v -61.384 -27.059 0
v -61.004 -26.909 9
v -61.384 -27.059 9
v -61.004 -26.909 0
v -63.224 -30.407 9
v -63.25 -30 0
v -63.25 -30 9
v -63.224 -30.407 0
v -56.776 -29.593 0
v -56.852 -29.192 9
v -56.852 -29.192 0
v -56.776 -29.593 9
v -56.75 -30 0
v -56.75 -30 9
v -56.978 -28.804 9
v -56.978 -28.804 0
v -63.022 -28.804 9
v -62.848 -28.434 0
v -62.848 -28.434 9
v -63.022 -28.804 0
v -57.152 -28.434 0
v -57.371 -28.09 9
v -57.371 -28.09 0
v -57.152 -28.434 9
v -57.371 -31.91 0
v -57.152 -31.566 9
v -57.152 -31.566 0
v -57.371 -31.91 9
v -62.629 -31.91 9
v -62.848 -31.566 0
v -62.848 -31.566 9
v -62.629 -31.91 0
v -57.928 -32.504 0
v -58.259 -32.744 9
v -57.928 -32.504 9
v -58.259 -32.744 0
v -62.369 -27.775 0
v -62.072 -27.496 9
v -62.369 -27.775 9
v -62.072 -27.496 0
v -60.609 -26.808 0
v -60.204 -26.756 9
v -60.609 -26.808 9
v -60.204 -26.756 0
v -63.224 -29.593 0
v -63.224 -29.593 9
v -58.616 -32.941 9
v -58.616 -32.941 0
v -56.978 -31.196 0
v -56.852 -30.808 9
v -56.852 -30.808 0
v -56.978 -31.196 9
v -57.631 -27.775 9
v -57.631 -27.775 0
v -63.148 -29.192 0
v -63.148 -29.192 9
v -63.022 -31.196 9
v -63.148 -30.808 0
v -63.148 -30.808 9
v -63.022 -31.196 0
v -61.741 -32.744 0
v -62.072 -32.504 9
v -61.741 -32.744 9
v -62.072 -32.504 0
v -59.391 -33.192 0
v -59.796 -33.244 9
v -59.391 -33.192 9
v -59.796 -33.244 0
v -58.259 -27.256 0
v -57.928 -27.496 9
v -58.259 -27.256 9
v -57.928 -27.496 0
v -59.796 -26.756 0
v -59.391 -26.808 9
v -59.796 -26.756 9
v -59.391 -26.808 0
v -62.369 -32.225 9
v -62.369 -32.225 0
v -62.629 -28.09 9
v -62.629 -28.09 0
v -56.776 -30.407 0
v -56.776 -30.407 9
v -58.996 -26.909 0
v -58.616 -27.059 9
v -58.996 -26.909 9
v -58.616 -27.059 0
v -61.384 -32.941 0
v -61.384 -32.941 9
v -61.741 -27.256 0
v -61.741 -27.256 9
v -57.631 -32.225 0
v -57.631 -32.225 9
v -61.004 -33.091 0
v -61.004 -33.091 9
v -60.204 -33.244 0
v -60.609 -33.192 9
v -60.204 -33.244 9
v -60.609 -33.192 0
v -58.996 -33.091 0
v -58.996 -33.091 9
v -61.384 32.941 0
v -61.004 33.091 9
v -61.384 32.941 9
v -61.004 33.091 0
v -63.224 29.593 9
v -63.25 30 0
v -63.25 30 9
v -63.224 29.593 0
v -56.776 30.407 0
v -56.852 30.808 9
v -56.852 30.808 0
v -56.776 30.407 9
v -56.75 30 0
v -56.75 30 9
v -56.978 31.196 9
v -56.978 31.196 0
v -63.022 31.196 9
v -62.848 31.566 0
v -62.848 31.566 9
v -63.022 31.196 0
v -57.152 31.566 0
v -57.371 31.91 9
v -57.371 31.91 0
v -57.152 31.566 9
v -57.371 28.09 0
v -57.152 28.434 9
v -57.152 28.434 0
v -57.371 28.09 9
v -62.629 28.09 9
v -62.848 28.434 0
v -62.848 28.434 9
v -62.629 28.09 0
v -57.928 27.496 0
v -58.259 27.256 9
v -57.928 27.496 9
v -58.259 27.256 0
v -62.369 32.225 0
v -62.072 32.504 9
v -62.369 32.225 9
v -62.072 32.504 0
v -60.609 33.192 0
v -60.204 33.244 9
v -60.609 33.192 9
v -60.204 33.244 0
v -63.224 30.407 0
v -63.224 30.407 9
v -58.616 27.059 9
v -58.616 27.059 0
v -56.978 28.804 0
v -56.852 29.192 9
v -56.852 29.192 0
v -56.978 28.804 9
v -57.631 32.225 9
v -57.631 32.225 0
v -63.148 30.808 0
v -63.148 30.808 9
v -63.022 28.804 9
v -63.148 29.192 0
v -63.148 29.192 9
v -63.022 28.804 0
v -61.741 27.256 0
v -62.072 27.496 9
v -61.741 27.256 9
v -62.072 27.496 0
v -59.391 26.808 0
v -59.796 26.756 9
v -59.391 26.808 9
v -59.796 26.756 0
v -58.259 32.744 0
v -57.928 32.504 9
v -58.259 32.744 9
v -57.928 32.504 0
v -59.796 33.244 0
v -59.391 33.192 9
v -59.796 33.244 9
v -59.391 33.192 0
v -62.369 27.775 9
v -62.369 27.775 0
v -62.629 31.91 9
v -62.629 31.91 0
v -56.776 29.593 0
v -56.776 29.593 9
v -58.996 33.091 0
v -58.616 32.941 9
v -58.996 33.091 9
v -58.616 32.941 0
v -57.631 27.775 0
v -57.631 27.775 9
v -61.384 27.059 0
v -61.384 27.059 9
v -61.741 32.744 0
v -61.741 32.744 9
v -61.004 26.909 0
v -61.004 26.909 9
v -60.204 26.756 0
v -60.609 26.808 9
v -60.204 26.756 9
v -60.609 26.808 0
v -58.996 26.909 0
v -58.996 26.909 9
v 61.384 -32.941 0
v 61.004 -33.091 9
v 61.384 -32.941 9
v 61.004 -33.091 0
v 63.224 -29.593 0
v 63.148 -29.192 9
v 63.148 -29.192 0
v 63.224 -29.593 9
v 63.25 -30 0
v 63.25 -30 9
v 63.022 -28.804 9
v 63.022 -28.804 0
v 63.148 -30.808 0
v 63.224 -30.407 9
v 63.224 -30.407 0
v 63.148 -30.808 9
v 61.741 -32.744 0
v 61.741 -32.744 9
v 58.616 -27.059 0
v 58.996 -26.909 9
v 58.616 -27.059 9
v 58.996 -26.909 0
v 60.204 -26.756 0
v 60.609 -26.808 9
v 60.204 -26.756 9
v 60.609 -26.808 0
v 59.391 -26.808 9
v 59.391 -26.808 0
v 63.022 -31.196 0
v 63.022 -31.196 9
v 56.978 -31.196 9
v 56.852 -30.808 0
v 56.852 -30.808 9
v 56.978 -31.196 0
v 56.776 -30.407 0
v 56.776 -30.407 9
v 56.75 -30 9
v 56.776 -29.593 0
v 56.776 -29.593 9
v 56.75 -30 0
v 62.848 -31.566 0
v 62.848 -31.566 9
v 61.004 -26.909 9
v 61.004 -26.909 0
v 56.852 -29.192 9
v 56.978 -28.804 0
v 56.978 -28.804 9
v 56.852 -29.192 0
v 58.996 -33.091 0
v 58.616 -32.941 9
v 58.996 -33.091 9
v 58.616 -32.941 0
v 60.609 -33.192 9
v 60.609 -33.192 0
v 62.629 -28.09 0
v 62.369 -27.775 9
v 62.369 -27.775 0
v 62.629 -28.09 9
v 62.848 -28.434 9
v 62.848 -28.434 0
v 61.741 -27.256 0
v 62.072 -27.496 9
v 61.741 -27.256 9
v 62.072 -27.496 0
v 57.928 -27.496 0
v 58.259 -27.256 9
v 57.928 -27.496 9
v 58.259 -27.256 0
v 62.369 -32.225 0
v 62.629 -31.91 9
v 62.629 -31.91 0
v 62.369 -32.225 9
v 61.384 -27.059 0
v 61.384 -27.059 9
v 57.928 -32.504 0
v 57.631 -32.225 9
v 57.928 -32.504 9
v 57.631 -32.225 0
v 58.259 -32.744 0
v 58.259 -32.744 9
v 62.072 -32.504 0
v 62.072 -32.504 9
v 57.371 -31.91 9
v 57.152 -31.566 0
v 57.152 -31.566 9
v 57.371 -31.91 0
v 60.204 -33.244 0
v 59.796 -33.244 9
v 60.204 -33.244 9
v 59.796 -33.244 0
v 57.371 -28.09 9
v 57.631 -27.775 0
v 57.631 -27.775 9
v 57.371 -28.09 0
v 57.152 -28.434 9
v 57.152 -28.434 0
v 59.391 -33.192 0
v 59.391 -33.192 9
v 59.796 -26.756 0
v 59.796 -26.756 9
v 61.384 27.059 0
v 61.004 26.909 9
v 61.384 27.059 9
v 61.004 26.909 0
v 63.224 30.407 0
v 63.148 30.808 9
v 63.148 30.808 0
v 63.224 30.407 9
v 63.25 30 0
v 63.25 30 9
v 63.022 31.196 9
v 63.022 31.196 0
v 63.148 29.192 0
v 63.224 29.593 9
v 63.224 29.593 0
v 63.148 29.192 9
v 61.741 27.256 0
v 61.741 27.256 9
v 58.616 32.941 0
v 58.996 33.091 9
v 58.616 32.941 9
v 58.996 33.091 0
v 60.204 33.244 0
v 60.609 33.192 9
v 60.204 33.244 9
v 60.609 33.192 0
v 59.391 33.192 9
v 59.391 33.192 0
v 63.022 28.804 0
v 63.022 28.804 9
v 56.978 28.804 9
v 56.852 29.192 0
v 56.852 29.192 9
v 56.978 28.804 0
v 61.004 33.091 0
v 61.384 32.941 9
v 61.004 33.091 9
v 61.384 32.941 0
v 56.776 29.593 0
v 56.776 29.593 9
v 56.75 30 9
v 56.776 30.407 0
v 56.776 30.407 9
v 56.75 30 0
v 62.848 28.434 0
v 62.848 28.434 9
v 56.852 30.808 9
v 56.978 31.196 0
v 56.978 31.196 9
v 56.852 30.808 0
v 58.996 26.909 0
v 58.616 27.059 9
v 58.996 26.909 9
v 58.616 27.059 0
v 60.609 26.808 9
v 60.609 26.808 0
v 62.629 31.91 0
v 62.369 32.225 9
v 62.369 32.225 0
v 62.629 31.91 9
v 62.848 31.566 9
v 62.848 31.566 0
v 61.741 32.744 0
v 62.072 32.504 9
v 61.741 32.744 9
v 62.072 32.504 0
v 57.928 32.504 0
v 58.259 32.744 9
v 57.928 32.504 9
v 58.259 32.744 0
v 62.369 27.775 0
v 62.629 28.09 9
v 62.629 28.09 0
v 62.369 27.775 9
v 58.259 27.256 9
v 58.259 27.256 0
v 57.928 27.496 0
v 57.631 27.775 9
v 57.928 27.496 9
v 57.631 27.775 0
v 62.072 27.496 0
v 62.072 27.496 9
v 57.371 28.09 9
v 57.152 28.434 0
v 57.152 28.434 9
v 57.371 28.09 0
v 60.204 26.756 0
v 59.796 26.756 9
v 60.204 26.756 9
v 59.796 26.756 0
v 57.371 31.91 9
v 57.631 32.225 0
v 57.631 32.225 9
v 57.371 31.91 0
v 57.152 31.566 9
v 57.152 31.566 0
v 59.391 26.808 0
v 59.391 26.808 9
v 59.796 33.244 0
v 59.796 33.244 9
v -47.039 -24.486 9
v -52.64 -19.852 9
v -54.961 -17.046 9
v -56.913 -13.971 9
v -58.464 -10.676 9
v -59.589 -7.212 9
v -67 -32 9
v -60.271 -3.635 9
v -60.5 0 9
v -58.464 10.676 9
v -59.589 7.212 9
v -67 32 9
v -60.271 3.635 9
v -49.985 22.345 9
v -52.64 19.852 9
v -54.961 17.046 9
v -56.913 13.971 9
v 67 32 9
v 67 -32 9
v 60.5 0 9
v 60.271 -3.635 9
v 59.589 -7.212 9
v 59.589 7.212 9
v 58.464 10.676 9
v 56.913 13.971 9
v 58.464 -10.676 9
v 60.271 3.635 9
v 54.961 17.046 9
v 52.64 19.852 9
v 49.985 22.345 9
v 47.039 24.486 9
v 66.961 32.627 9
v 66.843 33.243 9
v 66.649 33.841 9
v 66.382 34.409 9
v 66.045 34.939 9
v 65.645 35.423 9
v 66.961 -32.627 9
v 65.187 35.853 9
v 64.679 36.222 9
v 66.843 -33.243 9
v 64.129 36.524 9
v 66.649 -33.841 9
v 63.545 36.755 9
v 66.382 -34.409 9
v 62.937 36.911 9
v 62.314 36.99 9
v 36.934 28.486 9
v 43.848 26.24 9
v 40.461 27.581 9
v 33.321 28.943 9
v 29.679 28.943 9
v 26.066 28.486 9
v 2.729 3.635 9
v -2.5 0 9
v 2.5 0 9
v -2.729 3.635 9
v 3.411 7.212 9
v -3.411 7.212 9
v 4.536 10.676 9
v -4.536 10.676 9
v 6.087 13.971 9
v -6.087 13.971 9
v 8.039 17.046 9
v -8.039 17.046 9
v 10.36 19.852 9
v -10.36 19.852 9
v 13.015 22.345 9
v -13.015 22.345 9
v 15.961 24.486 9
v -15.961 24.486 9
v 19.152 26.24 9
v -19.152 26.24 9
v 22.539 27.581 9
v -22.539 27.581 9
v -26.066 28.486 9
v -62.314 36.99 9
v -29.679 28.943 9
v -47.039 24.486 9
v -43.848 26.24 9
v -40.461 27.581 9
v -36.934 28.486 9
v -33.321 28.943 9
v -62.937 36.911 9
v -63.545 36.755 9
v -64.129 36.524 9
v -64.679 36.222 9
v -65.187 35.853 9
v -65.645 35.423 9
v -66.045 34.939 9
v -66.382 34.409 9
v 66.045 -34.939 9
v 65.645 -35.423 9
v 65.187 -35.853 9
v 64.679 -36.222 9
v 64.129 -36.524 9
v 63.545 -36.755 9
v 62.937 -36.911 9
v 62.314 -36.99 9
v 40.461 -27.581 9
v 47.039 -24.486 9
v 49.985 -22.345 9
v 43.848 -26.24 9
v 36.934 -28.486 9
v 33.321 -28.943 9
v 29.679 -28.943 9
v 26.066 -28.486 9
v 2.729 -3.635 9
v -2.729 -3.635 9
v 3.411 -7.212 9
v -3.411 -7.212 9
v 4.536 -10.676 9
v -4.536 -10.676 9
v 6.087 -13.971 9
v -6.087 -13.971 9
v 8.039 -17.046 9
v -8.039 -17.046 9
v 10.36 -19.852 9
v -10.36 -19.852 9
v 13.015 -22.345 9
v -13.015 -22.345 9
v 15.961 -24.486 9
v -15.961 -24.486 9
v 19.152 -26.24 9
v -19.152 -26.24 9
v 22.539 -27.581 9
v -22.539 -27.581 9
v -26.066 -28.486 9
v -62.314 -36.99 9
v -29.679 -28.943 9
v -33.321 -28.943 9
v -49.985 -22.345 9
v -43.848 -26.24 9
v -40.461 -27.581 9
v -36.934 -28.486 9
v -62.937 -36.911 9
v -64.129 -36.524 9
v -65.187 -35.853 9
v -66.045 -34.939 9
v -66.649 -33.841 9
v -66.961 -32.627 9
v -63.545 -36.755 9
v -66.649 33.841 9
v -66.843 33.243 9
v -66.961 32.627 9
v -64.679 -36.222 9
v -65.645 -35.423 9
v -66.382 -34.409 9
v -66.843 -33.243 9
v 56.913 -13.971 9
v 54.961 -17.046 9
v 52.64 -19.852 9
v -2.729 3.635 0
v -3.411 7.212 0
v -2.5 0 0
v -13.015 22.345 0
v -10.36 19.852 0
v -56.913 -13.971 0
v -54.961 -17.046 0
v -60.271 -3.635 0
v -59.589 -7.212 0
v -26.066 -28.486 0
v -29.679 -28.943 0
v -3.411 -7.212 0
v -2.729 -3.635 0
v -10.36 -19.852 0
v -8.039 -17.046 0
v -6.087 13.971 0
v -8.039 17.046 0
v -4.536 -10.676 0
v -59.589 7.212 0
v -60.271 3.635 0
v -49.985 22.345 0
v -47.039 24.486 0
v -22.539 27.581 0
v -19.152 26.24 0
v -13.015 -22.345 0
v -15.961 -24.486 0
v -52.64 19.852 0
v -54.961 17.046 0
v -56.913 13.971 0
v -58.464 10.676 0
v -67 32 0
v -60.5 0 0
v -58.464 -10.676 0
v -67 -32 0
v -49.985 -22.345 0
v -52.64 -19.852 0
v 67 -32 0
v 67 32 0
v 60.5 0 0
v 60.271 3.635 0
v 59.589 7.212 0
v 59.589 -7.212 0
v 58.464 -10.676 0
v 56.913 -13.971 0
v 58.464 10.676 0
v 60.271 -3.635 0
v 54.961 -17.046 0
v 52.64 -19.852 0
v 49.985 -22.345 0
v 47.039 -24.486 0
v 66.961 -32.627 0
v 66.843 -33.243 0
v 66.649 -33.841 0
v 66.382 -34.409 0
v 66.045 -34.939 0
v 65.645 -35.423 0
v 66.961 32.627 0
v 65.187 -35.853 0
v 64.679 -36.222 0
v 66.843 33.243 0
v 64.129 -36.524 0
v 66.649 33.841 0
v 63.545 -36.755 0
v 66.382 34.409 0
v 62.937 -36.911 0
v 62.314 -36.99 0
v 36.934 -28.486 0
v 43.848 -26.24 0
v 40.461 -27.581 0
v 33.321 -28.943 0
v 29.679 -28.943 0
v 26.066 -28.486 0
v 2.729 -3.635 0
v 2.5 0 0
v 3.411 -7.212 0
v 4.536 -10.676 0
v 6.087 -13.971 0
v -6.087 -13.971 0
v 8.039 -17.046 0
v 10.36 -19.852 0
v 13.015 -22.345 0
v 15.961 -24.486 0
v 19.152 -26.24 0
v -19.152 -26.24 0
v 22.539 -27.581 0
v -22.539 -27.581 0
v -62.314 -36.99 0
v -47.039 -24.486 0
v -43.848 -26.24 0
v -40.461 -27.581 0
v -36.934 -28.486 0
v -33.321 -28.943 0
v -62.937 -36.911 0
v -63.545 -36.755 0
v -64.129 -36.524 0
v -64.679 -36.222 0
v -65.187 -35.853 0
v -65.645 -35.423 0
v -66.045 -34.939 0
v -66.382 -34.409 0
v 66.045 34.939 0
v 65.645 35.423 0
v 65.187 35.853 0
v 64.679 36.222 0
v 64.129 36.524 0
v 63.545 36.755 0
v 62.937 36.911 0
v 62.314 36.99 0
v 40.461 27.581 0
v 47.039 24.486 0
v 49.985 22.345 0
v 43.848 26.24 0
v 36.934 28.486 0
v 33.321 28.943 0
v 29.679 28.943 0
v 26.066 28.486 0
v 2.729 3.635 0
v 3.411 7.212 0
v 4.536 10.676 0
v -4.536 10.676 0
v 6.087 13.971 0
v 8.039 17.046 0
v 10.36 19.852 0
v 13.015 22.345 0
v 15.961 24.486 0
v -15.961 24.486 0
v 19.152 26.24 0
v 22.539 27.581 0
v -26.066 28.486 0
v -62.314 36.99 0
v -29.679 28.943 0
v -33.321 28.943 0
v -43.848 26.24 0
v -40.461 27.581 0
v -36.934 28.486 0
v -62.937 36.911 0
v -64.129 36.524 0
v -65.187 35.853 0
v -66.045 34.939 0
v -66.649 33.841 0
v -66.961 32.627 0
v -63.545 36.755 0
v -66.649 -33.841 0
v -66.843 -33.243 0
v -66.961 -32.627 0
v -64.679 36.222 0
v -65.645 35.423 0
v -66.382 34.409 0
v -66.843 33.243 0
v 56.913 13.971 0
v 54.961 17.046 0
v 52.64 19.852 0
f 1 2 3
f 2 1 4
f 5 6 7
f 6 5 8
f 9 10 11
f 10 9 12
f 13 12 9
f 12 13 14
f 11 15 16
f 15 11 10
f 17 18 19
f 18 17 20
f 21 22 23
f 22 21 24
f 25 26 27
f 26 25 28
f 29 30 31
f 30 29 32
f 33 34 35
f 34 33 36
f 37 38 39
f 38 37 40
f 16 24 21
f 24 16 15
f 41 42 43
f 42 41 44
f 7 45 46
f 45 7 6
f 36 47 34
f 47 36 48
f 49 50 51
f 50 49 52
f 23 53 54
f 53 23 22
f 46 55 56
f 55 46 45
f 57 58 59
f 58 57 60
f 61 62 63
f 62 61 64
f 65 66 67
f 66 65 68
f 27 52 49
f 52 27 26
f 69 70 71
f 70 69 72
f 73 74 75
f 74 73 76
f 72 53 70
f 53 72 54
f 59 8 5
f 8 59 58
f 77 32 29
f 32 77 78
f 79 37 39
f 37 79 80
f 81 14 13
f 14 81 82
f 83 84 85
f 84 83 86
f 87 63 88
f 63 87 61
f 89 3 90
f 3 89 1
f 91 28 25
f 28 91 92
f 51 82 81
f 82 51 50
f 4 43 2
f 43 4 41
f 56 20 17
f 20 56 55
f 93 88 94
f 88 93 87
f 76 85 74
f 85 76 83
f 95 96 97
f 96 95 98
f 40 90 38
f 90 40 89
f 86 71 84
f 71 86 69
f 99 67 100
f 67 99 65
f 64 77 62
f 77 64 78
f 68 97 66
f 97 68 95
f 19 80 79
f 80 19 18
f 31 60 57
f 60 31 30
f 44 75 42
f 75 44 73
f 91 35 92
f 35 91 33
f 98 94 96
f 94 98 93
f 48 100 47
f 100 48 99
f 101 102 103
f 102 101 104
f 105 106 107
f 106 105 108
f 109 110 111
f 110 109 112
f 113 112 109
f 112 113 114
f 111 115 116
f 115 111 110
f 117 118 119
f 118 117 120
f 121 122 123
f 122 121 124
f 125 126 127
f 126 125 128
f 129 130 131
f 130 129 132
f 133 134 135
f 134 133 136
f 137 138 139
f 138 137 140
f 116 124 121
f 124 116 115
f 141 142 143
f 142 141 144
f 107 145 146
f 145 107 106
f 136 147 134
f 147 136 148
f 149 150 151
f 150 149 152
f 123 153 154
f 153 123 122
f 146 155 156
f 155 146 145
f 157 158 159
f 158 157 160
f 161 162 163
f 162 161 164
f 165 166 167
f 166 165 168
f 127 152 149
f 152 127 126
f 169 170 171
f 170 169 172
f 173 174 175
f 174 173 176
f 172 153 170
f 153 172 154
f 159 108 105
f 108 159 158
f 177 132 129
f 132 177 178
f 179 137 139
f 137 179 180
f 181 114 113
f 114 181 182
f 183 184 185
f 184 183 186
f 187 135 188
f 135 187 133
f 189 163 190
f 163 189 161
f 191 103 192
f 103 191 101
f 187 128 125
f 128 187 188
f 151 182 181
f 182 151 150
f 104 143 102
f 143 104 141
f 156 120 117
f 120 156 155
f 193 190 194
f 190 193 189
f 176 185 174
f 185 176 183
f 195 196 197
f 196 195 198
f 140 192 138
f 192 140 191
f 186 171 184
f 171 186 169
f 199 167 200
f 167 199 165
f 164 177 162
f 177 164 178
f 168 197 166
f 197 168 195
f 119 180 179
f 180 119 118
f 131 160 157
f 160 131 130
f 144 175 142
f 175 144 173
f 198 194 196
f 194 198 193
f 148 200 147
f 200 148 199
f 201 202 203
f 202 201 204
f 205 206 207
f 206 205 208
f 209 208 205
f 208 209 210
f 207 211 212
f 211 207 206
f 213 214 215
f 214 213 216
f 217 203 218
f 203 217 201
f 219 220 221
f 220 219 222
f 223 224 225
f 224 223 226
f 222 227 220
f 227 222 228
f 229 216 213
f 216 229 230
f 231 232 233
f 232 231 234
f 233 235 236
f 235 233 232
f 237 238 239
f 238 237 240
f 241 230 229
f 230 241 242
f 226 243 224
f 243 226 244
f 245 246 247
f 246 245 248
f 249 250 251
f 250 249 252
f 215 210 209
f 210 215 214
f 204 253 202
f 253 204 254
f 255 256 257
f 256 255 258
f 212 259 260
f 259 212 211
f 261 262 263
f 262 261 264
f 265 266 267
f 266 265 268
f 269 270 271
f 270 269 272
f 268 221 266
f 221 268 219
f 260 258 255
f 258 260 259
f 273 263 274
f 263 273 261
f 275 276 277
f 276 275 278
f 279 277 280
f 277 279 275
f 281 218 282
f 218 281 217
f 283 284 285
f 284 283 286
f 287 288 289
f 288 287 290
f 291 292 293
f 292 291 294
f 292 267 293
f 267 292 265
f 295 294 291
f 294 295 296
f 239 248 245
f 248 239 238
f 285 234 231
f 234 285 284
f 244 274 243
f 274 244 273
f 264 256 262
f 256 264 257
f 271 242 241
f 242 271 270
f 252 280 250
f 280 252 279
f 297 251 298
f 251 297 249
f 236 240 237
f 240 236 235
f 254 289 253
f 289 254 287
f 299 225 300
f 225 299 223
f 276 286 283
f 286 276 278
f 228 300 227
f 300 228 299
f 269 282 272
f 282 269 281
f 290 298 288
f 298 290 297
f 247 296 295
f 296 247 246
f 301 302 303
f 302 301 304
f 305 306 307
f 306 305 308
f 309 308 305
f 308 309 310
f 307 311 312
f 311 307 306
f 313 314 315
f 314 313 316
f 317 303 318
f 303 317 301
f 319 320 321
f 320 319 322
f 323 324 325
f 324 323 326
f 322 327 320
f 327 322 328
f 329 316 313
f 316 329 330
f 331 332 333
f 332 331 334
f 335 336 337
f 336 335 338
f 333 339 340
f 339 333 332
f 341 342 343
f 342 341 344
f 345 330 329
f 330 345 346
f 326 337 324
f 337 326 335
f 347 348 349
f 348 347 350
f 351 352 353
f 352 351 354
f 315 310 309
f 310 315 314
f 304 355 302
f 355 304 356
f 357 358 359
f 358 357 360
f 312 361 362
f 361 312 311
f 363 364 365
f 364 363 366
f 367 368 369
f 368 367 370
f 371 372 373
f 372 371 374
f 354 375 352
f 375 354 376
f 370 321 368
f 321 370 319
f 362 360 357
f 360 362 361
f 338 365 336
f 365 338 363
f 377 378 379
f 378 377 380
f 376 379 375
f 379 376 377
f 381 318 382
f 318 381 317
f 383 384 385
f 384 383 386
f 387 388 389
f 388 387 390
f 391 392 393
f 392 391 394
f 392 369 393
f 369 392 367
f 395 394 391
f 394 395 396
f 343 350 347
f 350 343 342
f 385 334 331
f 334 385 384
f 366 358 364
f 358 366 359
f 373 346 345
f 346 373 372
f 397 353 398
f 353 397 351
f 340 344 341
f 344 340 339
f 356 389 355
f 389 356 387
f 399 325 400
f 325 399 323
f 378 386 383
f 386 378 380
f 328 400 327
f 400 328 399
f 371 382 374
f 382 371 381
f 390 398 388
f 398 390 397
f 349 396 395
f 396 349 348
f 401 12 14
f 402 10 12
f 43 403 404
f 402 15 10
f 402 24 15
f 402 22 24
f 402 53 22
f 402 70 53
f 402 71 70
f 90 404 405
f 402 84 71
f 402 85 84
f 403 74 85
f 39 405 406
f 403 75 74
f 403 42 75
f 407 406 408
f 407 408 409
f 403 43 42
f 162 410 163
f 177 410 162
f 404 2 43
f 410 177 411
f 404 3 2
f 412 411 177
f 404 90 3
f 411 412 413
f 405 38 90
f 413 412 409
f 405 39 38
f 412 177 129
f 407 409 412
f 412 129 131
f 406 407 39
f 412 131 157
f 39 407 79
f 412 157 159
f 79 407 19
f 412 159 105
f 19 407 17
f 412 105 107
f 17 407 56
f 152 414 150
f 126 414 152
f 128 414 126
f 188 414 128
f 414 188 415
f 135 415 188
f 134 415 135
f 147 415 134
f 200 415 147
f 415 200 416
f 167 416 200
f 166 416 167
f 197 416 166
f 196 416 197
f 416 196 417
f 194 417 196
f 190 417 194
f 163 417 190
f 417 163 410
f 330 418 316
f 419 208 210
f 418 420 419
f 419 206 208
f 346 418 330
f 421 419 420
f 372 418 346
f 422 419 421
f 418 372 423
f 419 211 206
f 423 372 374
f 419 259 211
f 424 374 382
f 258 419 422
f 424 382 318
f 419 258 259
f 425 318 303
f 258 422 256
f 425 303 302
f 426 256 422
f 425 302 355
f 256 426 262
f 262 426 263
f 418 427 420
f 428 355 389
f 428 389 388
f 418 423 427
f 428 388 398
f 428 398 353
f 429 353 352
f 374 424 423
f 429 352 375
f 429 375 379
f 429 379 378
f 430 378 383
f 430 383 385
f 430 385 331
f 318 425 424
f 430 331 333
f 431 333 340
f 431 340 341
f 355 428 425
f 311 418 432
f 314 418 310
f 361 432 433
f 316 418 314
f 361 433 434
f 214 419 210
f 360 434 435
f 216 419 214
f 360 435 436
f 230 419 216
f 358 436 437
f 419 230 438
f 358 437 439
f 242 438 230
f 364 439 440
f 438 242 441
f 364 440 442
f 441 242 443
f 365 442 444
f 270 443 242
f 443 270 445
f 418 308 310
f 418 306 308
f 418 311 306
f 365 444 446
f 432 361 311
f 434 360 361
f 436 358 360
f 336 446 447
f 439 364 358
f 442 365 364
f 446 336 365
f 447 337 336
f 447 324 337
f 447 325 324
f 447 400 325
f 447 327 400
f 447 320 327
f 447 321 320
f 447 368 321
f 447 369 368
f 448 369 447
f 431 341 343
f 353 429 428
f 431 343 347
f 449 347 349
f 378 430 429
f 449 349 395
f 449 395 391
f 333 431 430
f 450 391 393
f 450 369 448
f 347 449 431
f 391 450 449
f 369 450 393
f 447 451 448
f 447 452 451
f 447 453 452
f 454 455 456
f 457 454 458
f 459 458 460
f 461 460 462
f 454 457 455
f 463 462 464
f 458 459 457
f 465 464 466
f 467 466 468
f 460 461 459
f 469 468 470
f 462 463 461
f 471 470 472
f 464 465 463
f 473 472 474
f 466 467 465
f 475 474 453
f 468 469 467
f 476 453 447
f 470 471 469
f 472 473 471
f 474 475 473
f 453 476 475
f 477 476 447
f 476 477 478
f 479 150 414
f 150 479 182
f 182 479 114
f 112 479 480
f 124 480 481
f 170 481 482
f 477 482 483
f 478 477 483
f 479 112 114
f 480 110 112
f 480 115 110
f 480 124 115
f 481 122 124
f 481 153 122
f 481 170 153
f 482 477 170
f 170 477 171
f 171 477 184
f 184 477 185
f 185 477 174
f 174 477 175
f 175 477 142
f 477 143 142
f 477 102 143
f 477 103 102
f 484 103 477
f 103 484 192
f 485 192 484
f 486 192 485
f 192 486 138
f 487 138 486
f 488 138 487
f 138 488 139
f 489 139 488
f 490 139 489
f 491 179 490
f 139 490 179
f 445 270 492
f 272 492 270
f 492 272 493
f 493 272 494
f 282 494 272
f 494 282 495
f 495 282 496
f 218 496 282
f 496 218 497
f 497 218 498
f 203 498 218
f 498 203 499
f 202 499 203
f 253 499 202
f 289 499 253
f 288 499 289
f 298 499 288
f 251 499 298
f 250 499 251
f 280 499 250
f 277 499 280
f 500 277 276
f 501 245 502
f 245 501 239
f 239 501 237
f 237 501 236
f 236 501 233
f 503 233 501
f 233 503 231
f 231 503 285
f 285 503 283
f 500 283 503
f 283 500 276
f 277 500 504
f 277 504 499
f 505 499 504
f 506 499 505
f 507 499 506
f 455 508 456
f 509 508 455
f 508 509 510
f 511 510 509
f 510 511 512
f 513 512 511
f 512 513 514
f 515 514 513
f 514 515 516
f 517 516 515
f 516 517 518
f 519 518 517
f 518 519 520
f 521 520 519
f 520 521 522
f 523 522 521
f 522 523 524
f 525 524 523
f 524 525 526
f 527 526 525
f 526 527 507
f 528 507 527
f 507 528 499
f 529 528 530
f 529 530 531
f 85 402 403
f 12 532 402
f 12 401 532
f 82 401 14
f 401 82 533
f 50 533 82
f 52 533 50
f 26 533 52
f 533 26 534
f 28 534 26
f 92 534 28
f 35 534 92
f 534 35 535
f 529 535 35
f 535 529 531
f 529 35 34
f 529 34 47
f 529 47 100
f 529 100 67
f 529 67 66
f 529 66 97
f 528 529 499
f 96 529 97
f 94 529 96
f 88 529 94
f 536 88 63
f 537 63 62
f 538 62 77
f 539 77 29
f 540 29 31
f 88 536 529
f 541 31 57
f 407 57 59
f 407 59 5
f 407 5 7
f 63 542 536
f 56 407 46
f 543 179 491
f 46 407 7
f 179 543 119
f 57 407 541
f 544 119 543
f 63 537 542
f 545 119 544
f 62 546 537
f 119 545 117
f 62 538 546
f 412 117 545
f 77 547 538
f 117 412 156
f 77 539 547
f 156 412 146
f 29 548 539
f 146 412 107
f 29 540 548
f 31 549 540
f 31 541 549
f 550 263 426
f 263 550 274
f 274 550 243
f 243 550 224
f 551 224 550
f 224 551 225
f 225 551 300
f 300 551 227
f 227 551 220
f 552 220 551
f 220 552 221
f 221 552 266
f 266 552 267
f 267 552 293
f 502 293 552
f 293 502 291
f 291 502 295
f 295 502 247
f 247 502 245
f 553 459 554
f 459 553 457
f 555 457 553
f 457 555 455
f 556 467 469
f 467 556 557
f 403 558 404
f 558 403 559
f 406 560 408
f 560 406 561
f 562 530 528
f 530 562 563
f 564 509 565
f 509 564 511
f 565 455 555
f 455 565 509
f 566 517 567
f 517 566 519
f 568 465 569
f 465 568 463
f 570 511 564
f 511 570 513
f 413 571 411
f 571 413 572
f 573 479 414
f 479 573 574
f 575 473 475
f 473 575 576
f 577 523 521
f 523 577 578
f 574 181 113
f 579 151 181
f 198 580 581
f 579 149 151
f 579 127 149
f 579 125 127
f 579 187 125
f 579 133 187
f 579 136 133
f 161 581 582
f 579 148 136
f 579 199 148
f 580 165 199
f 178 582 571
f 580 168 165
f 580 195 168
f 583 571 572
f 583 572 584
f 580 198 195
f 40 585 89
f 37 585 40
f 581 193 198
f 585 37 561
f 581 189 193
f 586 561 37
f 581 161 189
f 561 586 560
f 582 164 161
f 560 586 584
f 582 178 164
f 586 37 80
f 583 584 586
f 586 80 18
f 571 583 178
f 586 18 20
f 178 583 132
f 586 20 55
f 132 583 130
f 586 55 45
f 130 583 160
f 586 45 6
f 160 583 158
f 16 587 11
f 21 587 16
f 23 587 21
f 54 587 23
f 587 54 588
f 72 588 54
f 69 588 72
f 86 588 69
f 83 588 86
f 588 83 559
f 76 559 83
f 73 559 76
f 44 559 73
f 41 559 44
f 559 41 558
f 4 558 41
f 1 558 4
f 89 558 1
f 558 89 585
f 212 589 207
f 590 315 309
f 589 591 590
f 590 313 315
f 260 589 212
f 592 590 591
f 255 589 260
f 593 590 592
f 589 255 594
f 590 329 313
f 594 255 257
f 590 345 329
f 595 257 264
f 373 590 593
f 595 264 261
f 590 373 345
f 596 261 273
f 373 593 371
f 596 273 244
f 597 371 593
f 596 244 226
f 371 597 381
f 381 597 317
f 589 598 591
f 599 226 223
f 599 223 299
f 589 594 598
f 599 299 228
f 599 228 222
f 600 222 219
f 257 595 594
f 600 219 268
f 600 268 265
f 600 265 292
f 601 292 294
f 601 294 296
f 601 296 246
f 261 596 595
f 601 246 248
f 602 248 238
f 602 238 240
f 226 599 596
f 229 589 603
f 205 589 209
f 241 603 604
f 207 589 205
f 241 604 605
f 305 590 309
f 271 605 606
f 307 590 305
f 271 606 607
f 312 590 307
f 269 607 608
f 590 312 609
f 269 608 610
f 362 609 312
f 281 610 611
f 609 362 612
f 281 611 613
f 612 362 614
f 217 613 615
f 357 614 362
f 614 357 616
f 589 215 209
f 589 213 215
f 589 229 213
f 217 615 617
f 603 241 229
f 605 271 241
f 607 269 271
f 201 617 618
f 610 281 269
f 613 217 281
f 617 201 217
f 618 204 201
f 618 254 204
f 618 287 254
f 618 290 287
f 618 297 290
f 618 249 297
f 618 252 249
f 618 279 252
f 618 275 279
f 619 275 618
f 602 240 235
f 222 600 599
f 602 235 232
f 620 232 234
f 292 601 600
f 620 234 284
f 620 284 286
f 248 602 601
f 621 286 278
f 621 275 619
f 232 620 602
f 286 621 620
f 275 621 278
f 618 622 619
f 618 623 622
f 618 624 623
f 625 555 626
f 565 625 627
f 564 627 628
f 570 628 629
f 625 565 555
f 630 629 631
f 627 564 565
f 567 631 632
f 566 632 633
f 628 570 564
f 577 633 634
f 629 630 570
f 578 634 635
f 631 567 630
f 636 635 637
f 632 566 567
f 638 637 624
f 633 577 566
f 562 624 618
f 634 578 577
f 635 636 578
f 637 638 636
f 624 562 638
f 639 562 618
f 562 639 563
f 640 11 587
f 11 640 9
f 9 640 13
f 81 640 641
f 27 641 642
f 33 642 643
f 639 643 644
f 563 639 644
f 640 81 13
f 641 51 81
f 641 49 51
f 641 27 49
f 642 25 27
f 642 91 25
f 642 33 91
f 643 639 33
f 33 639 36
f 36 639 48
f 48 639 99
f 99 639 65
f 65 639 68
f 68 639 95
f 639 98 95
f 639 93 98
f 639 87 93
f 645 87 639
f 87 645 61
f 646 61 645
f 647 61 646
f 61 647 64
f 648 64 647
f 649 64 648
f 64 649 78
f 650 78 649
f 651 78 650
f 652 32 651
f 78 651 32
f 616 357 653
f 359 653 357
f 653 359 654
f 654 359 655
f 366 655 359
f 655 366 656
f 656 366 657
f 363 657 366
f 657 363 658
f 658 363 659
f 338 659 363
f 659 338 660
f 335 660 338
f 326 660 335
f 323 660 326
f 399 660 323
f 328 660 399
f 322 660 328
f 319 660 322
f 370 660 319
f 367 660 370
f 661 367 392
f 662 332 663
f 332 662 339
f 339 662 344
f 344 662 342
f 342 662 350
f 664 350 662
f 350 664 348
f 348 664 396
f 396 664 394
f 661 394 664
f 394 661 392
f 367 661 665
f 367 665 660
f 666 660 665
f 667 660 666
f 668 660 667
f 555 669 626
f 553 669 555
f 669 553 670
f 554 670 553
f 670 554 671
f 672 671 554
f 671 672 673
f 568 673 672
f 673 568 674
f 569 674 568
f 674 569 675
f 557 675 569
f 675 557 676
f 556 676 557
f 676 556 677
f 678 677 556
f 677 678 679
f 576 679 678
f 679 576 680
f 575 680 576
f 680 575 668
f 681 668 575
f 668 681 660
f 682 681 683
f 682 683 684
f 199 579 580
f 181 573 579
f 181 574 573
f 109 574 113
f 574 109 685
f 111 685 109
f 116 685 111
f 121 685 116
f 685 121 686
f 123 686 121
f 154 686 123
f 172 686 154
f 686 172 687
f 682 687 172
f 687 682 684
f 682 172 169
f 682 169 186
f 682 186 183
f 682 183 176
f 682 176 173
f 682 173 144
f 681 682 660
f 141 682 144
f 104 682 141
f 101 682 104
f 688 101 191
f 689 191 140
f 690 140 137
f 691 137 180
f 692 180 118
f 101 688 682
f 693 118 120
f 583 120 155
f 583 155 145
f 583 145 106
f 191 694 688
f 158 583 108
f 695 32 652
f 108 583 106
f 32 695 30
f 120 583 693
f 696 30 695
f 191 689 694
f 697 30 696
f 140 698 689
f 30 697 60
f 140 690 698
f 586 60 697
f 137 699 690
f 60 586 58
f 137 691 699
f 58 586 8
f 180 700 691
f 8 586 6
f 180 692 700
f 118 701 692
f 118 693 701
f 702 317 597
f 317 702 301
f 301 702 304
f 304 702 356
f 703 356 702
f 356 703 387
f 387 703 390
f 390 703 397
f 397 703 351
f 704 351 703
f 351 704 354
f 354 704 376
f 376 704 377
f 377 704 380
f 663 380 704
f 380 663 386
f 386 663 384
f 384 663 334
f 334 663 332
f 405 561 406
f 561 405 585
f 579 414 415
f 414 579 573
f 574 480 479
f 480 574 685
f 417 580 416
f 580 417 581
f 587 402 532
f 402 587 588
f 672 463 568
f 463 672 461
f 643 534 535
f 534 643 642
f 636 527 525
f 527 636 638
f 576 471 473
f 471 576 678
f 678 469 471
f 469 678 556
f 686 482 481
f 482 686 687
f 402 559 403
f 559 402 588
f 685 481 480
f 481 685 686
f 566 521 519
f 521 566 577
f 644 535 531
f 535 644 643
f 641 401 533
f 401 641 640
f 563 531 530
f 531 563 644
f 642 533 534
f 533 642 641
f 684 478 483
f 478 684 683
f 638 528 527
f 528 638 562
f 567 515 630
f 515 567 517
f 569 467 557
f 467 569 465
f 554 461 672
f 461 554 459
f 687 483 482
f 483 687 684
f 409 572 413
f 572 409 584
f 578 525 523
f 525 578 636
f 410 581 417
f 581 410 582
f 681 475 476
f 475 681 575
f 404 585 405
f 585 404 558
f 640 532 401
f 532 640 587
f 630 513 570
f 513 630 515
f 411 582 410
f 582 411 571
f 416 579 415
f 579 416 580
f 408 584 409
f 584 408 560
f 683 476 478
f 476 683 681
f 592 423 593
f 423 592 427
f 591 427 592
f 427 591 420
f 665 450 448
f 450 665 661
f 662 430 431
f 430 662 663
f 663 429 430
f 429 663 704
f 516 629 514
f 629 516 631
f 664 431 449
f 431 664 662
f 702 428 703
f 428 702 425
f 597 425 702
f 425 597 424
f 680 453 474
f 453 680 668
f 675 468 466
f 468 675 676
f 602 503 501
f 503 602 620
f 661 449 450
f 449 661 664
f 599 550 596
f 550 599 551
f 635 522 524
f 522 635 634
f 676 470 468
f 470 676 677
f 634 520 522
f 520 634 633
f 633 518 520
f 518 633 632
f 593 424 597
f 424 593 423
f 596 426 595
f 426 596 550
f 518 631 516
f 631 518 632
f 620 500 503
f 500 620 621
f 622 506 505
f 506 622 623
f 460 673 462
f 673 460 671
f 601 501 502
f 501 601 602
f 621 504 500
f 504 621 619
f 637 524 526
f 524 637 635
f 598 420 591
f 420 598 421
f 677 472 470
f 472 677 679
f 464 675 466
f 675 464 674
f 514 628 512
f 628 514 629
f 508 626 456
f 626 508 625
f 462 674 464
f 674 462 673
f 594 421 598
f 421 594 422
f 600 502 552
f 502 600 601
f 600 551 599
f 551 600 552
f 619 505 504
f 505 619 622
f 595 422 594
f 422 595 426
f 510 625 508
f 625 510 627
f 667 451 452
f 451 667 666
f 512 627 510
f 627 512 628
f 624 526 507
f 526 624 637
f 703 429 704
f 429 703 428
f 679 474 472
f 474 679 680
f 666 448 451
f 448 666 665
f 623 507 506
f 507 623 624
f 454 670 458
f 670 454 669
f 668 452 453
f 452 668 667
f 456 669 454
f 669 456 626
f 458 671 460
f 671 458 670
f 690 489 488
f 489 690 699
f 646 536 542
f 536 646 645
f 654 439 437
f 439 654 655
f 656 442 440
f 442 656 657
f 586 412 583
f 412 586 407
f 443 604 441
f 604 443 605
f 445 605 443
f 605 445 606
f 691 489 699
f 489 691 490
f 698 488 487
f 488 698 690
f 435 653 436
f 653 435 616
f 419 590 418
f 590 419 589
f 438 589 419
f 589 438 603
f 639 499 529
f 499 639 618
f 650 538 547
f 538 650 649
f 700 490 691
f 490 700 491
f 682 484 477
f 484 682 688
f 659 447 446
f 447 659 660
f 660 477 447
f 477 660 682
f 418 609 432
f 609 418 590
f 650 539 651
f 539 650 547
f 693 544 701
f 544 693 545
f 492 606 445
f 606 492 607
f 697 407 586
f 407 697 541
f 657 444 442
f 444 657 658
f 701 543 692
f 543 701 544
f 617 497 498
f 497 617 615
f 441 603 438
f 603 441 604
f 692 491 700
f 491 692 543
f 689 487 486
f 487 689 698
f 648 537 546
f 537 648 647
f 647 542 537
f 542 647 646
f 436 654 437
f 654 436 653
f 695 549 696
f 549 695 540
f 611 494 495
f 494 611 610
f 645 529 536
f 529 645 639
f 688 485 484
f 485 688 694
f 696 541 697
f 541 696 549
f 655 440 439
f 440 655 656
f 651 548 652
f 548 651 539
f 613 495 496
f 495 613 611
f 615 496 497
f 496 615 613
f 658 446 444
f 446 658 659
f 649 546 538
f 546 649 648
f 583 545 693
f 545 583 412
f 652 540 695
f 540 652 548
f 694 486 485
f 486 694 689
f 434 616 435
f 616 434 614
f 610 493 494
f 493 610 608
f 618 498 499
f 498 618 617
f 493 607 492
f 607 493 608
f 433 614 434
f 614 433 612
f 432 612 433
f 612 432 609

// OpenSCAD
$fn = 50;


difference() {
	union() {
		hull() {
			translate(v = [-62.0000000000, 32.0000000000, 0]) {
				cylinder(h = 9, r = 5);
			}
			translate(v = [62.0000000000, 32.0000000000, 0]) {
				cylinder(h = 9, r = 5);
			}
			translate(v = [-62.0000000000, -32.0000000000, 0]) {
				cylinder(h = 9, r = 5);
			}
			translate(v = [62.0000000000, -32.0000000000, 0]) {
				cylinder(h = 9, r = 5);
			}
		}
	}
	union() {
		#translate(v = [-60.0000000000, -30.0000000000, -100.0000000000]) {
			cylinder(h = 200, r = 3.2500000000);
		}
		#translate(v = [-60.0000000000, 30.0000000000, -100.0000000000]) {
			cylinder(h = 200, r = 3.2500000000);
		}
		#translate(v = [60.0000000000, -30.0000000000, -100.0000000000]) {
			cylinder(h = 200, r = 3.2500000000);
		}
		#translate(v = [60.0000000000, 30.0000000000, -100.0000000000]) {
			cylinder(h = 200, r = 3.2500000000);
		}
		#translate(v = [-31.5000000000, 0, 0]) {
			cylinder(h = 9, r = 29.0000000000);
		}
		#translate(v = [31.5000000000, 0, 0]) {
			cylinder(h = 9, r = 29.0000000000);
		}
	}
}
